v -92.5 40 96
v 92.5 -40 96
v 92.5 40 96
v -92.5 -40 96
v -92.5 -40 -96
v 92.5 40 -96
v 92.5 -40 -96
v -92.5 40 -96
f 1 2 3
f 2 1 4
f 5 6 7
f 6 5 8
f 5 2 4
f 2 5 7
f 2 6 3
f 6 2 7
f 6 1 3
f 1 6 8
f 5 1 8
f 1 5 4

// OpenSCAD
module battery()
{
	color("red") cube([185, 80, 192], center=true);
}

battery();
